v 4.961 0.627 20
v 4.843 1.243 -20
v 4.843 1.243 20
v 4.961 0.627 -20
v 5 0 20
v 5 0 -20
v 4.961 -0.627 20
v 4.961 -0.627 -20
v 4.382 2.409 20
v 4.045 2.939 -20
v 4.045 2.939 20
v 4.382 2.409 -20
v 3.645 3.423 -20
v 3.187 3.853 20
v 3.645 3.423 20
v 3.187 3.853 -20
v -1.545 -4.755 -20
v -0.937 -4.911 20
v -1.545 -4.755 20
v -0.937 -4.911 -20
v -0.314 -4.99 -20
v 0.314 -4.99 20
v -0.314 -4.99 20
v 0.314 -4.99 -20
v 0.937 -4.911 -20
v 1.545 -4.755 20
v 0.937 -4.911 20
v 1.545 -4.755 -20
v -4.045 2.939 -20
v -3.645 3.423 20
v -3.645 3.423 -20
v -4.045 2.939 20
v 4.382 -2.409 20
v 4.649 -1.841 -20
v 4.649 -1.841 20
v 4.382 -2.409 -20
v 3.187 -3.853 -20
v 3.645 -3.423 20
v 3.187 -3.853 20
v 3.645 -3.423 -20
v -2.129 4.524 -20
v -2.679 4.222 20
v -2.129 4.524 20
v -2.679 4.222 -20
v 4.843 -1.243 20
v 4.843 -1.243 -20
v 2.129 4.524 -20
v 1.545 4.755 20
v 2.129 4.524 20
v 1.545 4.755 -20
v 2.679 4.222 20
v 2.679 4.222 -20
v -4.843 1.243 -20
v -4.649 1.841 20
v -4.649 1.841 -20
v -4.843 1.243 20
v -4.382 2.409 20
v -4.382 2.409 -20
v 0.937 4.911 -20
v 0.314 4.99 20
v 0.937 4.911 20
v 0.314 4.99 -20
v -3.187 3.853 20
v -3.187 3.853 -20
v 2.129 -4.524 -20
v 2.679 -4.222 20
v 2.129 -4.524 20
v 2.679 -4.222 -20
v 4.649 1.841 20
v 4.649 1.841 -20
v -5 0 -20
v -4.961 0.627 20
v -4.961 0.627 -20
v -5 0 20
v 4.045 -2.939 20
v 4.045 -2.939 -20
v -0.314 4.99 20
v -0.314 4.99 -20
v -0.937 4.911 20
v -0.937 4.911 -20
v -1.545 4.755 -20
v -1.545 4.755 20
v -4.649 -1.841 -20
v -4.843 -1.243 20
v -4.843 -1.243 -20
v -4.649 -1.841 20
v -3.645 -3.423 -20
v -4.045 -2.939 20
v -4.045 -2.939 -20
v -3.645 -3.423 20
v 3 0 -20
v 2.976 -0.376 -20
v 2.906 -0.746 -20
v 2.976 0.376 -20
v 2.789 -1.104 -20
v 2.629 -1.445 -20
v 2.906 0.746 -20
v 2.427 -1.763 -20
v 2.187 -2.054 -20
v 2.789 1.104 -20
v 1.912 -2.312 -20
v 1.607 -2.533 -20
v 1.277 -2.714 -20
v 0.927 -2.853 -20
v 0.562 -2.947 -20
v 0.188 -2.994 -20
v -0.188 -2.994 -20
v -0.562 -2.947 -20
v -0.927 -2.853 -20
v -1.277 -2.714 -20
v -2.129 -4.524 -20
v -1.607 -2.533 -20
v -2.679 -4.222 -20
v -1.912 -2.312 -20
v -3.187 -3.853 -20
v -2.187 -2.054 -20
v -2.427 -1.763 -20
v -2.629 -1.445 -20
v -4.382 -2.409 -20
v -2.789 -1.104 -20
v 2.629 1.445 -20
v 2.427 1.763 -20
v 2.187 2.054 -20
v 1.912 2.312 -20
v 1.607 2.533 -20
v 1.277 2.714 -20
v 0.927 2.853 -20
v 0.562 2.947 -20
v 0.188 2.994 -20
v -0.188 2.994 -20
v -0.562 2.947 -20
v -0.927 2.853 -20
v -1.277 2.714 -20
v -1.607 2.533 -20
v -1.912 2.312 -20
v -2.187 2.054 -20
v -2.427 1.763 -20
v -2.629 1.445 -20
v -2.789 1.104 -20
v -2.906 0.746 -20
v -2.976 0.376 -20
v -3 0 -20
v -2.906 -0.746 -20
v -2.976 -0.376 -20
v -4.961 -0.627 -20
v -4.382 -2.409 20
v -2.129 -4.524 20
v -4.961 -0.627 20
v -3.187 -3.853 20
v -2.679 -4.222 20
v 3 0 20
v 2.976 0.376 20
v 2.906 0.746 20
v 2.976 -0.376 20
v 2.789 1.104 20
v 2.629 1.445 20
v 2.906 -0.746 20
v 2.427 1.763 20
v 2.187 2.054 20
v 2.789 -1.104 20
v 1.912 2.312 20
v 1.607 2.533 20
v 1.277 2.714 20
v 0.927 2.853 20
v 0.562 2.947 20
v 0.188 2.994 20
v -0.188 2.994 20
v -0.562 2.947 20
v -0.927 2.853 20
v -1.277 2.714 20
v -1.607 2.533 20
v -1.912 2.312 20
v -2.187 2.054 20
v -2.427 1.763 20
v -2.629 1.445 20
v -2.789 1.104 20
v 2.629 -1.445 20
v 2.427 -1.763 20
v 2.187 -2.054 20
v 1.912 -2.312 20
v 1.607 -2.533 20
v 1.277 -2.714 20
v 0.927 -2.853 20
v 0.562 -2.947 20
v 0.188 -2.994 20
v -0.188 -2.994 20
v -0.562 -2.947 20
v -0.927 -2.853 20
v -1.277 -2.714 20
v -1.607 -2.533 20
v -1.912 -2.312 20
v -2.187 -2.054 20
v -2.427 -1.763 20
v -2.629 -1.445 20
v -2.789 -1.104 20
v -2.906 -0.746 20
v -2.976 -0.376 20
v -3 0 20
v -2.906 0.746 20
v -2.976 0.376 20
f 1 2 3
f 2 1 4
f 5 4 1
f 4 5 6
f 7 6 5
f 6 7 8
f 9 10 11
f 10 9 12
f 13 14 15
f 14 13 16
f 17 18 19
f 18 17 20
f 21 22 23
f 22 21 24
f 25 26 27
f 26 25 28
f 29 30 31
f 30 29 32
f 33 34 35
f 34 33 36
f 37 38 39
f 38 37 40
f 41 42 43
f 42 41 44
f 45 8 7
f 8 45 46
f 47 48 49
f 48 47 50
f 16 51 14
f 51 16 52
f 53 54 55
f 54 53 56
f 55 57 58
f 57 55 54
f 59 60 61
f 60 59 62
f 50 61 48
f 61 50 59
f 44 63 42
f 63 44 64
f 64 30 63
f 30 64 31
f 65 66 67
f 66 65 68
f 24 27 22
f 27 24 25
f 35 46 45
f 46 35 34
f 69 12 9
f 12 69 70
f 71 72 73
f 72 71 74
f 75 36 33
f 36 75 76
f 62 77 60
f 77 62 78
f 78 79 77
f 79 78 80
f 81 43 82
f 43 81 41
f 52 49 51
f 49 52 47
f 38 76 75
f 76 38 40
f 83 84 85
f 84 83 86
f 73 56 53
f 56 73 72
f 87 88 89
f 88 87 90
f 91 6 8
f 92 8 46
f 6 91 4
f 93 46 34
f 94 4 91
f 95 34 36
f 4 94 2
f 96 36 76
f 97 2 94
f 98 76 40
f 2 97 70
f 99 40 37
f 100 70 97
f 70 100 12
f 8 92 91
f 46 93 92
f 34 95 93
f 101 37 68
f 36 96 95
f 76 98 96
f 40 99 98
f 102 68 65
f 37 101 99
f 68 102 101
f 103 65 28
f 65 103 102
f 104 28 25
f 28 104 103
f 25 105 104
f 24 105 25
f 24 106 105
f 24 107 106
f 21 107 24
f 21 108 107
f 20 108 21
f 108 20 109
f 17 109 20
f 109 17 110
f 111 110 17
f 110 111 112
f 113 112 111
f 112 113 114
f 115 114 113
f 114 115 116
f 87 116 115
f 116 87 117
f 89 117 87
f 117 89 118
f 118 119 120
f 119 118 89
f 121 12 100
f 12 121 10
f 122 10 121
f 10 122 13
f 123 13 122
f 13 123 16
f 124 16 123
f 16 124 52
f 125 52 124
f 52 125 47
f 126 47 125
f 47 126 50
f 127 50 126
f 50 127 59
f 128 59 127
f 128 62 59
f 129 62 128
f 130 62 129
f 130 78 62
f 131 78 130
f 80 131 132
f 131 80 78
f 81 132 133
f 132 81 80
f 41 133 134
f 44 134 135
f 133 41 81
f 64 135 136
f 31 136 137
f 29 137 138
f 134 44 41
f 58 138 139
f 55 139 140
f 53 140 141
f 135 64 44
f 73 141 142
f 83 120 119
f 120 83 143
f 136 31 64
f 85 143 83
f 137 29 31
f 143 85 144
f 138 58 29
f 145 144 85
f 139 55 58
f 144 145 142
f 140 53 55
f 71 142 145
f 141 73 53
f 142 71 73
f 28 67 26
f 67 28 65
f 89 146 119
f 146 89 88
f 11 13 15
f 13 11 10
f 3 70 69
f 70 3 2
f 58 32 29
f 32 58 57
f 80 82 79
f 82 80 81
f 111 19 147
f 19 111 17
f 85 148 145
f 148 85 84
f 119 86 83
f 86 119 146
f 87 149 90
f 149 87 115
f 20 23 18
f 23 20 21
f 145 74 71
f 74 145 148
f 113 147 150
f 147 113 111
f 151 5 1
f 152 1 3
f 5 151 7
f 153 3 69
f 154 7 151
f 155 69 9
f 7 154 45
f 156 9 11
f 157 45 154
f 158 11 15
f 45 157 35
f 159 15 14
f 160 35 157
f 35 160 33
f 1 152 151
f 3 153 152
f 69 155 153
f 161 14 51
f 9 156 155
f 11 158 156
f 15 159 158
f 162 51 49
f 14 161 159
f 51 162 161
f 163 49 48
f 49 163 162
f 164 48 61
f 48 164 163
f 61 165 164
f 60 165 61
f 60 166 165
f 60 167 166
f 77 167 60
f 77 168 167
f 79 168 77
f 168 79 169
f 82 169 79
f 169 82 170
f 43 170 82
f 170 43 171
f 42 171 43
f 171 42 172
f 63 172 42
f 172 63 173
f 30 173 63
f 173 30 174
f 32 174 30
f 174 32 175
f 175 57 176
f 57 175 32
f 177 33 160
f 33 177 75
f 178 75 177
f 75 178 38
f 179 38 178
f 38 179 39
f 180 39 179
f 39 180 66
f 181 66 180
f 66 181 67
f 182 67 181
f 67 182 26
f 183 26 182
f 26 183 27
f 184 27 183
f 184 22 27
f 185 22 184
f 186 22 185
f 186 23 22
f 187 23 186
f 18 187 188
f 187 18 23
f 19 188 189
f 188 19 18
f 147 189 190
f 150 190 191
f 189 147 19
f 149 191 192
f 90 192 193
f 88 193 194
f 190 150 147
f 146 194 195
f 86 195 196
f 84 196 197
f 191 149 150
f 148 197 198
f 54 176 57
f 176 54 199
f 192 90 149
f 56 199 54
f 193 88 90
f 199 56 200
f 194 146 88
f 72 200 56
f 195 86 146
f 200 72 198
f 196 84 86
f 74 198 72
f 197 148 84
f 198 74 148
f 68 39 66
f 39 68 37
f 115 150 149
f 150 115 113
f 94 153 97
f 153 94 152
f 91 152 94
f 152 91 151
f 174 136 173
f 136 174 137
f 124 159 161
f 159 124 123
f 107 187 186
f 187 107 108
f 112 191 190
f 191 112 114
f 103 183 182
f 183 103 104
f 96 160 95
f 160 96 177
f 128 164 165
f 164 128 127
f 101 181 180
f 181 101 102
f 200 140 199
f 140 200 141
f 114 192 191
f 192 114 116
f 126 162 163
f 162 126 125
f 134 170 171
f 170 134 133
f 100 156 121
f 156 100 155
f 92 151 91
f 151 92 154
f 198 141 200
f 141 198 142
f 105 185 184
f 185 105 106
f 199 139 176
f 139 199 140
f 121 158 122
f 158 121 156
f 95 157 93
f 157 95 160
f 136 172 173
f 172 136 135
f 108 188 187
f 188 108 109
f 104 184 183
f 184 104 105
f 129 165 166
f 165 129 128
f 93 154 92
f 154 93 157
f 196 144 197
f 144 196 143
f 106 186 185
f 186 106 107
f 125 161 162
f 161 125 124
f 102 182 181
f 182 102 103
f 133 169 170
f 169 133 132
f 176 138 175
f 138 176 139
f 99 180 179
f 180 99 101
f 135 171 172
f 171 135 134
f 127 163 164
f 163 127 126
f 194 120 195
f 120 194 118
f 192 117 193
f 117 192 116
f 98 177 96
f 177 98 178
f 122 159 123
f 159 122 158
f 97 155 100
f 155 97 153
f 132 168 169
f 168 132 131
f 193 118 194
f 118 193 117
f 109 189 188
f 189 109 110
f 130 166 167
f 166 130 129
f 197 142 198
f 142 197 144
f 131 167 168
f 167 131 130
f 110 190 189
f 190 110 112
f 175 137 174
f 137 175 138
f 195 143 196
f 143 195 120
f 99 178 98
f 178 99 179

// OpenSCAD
$fn = 50;


difference() {
	union() {
		translate(v = [0, 0, -20.0000000000]) {
			cylinder(h = 40, r = 5.0000000000);
		}
	}
	union() {
		translate(v = [0, 0, -100.0000000000]) {
			cylinder(h = 200, r = 3.0000000000);
		}
	}
}
